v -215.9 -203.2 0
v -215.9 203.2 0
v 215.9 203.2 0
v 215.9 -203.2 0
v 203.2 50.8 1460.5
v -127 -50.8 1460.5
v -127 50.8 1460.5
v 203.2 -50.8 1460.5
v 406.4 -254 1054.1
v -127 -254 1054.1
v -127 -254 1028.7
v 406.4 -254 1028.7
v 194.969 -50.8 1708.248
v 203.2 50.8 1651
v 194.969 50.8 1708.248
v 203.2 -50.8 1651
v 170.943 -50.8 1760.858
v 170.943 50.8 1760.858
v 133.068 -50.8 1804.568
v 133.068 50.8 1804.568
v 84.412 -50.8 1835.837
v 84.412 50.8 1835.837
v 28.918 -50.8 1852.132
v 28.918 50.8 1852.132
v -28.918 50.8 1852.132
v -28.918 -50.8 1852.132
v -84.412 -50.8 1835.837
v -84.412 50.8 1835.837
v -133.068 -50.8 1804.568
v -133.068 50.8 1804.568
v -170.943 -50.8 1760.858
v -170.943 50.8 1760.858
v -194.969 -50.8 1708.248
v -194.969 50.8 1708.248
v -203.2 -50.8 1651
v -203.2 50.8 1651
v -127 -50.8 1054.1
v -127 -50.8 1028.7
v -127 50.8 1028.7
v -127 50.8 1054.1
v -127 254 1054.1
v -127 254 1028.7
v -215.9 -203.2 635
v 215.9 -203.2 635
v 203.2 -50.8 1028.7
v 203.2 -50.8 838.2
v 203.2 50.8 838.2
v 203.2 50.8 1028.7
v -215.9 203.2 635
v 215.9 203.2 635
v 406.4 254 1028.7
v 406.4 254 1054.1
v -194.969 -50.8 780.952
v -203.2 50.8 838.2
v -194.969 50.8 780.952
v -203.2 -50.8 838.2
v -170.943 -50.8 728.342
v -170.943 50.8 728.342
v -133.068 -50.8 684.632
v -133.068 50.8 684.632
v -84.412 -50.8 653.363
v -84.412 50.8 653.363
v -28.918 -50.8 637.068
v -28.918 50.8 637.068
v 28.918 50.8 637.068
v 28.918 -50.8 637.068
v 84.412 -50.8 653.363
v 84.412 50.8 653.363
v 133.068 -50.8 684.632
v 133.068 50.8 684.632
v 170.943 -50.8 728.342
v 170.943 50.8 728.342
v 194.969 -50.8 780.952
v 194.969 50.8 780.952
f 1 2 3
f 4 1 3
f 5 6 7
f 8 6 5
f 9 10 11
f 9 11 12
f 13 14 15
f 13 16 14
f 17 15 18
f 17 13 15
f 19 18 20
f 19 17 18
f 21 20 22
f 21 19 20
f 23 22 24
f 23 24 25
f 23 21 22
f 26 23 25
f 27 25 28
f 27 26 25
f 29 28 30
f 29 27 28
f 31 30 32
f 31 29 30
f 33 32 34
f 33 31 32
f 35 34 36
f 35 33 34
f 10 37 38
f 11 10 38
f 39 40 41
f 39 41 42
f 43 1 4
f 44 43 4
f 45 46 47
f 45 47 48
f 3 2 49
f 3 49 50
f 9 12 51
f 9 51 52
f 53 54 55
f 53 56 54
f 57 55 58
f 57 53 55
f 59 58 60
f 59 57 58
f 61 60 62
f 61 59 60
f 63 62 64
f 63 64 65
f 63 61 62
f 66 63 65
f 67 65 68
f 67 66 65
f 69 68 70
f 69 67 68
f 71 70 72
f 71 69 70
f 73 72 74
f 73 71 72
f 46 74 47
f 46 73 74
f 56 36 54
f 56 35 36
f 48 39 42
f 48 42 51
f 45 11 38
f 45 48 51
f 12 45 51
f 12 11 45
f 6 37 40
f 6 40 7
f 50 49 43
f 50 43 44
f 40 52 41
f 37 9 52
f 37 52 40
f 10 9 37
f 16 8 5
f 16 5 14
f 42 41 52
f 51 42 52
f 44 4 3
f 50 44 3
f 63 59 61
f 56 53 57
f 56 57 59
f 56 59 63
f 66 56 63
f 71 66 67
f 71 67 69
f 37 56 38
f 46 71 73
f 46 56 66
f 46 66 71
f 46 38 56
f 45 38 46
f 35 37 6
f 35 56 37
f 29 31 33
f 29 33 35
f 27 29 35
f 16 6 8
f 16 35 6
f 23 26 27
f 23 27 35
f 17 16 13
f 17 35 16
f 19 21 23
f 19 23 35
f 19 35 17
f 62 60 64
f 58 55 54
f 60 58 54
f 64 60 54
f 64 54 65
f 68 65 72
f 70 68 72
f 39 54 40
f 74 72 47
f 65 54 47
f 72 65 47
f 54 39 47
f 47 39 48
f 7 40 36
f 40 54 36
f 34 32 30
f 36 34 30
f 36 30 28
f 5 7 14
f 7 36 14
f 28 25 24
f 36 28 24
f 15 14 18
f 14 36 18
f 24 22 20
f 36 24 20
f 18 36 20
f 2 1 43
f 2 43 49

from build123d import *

# Parameters (mm, degrees)
F0_W     = 431.8
F0_H     = 406.4
F1_DEPTH = 635
F2_R     = 177.8
F3_DEPTH = 50.8
F4_DEPTH = 254


with BuildPart() as f1:
    # F0 (on Top) → F1 (new body)
    with BuildSketch(Plane.XY):
        Rectangle(F0_W, F0_H)
    extrude(amount=F1_DEPTH)


with BuildPart() as f3:
    # F2 (on Front) → F3 (new body, symmetric)
    with BuildSketch(Plane.XZ):
        with BuildLine():
            Line((-127, 1028.7), (-203.2, 1028.7))
            Line((-203.2, 1028.7), (-203.2, 838.2))
            ThreePointArc((-203.2, 838.2), (0, 635), (203.2, 838.2))
            Line((203.2, 838.2), (203.2, 1028.7))
            Line((203.2, 1028.7), (-127, 1028.7))
        make_face()
        with Locations((0, 838.2)):
            Circle(F2_R, mode=Mode.SUBTRACT)
        with BuildLine():
            ThreePointArc((203.2, 1651), (0, 1854.2), (-203.2, 1651))
            Line((-203.2, 1651), (-203.2, 1460.5))
            Line((-203.2, 1460.5), (-127, 1460.5))
            Line((-127, 1460.5), (203.2, 1460.5))
            Line((203.2, 1460.5), (203.2, 1651))
        make_face()
        with Locations((0, 1651)):
            Circle(F2_R, mode=Mode.SUBTRACT)
        Polygon((-127, 1460.5), (-203.2, 1460.5), (-203.2, 1028.7), (-127, 1028.7), (-127, 1054.1), align=None)
        with Locations((0, 1651)):
            Circle(F2_R)
        with Locations((0, 838.2)):
            Circle(F2_R)
    extrude(amount=F3_DEPTH, both=True)

    # F2 (on Front) → F4 (join, symmetric)
    with BuildSketch(Plane.XZ):
        Polygon((-127, 1054.1), (-127, 1028.7), (203.2, 1028.7), (406.4, 1028.7), (406.4, 1054.1), align=None)
    extrude(amount=F4_DEPTH, both=True)


solid = Compound([f1.part, f3.part])
